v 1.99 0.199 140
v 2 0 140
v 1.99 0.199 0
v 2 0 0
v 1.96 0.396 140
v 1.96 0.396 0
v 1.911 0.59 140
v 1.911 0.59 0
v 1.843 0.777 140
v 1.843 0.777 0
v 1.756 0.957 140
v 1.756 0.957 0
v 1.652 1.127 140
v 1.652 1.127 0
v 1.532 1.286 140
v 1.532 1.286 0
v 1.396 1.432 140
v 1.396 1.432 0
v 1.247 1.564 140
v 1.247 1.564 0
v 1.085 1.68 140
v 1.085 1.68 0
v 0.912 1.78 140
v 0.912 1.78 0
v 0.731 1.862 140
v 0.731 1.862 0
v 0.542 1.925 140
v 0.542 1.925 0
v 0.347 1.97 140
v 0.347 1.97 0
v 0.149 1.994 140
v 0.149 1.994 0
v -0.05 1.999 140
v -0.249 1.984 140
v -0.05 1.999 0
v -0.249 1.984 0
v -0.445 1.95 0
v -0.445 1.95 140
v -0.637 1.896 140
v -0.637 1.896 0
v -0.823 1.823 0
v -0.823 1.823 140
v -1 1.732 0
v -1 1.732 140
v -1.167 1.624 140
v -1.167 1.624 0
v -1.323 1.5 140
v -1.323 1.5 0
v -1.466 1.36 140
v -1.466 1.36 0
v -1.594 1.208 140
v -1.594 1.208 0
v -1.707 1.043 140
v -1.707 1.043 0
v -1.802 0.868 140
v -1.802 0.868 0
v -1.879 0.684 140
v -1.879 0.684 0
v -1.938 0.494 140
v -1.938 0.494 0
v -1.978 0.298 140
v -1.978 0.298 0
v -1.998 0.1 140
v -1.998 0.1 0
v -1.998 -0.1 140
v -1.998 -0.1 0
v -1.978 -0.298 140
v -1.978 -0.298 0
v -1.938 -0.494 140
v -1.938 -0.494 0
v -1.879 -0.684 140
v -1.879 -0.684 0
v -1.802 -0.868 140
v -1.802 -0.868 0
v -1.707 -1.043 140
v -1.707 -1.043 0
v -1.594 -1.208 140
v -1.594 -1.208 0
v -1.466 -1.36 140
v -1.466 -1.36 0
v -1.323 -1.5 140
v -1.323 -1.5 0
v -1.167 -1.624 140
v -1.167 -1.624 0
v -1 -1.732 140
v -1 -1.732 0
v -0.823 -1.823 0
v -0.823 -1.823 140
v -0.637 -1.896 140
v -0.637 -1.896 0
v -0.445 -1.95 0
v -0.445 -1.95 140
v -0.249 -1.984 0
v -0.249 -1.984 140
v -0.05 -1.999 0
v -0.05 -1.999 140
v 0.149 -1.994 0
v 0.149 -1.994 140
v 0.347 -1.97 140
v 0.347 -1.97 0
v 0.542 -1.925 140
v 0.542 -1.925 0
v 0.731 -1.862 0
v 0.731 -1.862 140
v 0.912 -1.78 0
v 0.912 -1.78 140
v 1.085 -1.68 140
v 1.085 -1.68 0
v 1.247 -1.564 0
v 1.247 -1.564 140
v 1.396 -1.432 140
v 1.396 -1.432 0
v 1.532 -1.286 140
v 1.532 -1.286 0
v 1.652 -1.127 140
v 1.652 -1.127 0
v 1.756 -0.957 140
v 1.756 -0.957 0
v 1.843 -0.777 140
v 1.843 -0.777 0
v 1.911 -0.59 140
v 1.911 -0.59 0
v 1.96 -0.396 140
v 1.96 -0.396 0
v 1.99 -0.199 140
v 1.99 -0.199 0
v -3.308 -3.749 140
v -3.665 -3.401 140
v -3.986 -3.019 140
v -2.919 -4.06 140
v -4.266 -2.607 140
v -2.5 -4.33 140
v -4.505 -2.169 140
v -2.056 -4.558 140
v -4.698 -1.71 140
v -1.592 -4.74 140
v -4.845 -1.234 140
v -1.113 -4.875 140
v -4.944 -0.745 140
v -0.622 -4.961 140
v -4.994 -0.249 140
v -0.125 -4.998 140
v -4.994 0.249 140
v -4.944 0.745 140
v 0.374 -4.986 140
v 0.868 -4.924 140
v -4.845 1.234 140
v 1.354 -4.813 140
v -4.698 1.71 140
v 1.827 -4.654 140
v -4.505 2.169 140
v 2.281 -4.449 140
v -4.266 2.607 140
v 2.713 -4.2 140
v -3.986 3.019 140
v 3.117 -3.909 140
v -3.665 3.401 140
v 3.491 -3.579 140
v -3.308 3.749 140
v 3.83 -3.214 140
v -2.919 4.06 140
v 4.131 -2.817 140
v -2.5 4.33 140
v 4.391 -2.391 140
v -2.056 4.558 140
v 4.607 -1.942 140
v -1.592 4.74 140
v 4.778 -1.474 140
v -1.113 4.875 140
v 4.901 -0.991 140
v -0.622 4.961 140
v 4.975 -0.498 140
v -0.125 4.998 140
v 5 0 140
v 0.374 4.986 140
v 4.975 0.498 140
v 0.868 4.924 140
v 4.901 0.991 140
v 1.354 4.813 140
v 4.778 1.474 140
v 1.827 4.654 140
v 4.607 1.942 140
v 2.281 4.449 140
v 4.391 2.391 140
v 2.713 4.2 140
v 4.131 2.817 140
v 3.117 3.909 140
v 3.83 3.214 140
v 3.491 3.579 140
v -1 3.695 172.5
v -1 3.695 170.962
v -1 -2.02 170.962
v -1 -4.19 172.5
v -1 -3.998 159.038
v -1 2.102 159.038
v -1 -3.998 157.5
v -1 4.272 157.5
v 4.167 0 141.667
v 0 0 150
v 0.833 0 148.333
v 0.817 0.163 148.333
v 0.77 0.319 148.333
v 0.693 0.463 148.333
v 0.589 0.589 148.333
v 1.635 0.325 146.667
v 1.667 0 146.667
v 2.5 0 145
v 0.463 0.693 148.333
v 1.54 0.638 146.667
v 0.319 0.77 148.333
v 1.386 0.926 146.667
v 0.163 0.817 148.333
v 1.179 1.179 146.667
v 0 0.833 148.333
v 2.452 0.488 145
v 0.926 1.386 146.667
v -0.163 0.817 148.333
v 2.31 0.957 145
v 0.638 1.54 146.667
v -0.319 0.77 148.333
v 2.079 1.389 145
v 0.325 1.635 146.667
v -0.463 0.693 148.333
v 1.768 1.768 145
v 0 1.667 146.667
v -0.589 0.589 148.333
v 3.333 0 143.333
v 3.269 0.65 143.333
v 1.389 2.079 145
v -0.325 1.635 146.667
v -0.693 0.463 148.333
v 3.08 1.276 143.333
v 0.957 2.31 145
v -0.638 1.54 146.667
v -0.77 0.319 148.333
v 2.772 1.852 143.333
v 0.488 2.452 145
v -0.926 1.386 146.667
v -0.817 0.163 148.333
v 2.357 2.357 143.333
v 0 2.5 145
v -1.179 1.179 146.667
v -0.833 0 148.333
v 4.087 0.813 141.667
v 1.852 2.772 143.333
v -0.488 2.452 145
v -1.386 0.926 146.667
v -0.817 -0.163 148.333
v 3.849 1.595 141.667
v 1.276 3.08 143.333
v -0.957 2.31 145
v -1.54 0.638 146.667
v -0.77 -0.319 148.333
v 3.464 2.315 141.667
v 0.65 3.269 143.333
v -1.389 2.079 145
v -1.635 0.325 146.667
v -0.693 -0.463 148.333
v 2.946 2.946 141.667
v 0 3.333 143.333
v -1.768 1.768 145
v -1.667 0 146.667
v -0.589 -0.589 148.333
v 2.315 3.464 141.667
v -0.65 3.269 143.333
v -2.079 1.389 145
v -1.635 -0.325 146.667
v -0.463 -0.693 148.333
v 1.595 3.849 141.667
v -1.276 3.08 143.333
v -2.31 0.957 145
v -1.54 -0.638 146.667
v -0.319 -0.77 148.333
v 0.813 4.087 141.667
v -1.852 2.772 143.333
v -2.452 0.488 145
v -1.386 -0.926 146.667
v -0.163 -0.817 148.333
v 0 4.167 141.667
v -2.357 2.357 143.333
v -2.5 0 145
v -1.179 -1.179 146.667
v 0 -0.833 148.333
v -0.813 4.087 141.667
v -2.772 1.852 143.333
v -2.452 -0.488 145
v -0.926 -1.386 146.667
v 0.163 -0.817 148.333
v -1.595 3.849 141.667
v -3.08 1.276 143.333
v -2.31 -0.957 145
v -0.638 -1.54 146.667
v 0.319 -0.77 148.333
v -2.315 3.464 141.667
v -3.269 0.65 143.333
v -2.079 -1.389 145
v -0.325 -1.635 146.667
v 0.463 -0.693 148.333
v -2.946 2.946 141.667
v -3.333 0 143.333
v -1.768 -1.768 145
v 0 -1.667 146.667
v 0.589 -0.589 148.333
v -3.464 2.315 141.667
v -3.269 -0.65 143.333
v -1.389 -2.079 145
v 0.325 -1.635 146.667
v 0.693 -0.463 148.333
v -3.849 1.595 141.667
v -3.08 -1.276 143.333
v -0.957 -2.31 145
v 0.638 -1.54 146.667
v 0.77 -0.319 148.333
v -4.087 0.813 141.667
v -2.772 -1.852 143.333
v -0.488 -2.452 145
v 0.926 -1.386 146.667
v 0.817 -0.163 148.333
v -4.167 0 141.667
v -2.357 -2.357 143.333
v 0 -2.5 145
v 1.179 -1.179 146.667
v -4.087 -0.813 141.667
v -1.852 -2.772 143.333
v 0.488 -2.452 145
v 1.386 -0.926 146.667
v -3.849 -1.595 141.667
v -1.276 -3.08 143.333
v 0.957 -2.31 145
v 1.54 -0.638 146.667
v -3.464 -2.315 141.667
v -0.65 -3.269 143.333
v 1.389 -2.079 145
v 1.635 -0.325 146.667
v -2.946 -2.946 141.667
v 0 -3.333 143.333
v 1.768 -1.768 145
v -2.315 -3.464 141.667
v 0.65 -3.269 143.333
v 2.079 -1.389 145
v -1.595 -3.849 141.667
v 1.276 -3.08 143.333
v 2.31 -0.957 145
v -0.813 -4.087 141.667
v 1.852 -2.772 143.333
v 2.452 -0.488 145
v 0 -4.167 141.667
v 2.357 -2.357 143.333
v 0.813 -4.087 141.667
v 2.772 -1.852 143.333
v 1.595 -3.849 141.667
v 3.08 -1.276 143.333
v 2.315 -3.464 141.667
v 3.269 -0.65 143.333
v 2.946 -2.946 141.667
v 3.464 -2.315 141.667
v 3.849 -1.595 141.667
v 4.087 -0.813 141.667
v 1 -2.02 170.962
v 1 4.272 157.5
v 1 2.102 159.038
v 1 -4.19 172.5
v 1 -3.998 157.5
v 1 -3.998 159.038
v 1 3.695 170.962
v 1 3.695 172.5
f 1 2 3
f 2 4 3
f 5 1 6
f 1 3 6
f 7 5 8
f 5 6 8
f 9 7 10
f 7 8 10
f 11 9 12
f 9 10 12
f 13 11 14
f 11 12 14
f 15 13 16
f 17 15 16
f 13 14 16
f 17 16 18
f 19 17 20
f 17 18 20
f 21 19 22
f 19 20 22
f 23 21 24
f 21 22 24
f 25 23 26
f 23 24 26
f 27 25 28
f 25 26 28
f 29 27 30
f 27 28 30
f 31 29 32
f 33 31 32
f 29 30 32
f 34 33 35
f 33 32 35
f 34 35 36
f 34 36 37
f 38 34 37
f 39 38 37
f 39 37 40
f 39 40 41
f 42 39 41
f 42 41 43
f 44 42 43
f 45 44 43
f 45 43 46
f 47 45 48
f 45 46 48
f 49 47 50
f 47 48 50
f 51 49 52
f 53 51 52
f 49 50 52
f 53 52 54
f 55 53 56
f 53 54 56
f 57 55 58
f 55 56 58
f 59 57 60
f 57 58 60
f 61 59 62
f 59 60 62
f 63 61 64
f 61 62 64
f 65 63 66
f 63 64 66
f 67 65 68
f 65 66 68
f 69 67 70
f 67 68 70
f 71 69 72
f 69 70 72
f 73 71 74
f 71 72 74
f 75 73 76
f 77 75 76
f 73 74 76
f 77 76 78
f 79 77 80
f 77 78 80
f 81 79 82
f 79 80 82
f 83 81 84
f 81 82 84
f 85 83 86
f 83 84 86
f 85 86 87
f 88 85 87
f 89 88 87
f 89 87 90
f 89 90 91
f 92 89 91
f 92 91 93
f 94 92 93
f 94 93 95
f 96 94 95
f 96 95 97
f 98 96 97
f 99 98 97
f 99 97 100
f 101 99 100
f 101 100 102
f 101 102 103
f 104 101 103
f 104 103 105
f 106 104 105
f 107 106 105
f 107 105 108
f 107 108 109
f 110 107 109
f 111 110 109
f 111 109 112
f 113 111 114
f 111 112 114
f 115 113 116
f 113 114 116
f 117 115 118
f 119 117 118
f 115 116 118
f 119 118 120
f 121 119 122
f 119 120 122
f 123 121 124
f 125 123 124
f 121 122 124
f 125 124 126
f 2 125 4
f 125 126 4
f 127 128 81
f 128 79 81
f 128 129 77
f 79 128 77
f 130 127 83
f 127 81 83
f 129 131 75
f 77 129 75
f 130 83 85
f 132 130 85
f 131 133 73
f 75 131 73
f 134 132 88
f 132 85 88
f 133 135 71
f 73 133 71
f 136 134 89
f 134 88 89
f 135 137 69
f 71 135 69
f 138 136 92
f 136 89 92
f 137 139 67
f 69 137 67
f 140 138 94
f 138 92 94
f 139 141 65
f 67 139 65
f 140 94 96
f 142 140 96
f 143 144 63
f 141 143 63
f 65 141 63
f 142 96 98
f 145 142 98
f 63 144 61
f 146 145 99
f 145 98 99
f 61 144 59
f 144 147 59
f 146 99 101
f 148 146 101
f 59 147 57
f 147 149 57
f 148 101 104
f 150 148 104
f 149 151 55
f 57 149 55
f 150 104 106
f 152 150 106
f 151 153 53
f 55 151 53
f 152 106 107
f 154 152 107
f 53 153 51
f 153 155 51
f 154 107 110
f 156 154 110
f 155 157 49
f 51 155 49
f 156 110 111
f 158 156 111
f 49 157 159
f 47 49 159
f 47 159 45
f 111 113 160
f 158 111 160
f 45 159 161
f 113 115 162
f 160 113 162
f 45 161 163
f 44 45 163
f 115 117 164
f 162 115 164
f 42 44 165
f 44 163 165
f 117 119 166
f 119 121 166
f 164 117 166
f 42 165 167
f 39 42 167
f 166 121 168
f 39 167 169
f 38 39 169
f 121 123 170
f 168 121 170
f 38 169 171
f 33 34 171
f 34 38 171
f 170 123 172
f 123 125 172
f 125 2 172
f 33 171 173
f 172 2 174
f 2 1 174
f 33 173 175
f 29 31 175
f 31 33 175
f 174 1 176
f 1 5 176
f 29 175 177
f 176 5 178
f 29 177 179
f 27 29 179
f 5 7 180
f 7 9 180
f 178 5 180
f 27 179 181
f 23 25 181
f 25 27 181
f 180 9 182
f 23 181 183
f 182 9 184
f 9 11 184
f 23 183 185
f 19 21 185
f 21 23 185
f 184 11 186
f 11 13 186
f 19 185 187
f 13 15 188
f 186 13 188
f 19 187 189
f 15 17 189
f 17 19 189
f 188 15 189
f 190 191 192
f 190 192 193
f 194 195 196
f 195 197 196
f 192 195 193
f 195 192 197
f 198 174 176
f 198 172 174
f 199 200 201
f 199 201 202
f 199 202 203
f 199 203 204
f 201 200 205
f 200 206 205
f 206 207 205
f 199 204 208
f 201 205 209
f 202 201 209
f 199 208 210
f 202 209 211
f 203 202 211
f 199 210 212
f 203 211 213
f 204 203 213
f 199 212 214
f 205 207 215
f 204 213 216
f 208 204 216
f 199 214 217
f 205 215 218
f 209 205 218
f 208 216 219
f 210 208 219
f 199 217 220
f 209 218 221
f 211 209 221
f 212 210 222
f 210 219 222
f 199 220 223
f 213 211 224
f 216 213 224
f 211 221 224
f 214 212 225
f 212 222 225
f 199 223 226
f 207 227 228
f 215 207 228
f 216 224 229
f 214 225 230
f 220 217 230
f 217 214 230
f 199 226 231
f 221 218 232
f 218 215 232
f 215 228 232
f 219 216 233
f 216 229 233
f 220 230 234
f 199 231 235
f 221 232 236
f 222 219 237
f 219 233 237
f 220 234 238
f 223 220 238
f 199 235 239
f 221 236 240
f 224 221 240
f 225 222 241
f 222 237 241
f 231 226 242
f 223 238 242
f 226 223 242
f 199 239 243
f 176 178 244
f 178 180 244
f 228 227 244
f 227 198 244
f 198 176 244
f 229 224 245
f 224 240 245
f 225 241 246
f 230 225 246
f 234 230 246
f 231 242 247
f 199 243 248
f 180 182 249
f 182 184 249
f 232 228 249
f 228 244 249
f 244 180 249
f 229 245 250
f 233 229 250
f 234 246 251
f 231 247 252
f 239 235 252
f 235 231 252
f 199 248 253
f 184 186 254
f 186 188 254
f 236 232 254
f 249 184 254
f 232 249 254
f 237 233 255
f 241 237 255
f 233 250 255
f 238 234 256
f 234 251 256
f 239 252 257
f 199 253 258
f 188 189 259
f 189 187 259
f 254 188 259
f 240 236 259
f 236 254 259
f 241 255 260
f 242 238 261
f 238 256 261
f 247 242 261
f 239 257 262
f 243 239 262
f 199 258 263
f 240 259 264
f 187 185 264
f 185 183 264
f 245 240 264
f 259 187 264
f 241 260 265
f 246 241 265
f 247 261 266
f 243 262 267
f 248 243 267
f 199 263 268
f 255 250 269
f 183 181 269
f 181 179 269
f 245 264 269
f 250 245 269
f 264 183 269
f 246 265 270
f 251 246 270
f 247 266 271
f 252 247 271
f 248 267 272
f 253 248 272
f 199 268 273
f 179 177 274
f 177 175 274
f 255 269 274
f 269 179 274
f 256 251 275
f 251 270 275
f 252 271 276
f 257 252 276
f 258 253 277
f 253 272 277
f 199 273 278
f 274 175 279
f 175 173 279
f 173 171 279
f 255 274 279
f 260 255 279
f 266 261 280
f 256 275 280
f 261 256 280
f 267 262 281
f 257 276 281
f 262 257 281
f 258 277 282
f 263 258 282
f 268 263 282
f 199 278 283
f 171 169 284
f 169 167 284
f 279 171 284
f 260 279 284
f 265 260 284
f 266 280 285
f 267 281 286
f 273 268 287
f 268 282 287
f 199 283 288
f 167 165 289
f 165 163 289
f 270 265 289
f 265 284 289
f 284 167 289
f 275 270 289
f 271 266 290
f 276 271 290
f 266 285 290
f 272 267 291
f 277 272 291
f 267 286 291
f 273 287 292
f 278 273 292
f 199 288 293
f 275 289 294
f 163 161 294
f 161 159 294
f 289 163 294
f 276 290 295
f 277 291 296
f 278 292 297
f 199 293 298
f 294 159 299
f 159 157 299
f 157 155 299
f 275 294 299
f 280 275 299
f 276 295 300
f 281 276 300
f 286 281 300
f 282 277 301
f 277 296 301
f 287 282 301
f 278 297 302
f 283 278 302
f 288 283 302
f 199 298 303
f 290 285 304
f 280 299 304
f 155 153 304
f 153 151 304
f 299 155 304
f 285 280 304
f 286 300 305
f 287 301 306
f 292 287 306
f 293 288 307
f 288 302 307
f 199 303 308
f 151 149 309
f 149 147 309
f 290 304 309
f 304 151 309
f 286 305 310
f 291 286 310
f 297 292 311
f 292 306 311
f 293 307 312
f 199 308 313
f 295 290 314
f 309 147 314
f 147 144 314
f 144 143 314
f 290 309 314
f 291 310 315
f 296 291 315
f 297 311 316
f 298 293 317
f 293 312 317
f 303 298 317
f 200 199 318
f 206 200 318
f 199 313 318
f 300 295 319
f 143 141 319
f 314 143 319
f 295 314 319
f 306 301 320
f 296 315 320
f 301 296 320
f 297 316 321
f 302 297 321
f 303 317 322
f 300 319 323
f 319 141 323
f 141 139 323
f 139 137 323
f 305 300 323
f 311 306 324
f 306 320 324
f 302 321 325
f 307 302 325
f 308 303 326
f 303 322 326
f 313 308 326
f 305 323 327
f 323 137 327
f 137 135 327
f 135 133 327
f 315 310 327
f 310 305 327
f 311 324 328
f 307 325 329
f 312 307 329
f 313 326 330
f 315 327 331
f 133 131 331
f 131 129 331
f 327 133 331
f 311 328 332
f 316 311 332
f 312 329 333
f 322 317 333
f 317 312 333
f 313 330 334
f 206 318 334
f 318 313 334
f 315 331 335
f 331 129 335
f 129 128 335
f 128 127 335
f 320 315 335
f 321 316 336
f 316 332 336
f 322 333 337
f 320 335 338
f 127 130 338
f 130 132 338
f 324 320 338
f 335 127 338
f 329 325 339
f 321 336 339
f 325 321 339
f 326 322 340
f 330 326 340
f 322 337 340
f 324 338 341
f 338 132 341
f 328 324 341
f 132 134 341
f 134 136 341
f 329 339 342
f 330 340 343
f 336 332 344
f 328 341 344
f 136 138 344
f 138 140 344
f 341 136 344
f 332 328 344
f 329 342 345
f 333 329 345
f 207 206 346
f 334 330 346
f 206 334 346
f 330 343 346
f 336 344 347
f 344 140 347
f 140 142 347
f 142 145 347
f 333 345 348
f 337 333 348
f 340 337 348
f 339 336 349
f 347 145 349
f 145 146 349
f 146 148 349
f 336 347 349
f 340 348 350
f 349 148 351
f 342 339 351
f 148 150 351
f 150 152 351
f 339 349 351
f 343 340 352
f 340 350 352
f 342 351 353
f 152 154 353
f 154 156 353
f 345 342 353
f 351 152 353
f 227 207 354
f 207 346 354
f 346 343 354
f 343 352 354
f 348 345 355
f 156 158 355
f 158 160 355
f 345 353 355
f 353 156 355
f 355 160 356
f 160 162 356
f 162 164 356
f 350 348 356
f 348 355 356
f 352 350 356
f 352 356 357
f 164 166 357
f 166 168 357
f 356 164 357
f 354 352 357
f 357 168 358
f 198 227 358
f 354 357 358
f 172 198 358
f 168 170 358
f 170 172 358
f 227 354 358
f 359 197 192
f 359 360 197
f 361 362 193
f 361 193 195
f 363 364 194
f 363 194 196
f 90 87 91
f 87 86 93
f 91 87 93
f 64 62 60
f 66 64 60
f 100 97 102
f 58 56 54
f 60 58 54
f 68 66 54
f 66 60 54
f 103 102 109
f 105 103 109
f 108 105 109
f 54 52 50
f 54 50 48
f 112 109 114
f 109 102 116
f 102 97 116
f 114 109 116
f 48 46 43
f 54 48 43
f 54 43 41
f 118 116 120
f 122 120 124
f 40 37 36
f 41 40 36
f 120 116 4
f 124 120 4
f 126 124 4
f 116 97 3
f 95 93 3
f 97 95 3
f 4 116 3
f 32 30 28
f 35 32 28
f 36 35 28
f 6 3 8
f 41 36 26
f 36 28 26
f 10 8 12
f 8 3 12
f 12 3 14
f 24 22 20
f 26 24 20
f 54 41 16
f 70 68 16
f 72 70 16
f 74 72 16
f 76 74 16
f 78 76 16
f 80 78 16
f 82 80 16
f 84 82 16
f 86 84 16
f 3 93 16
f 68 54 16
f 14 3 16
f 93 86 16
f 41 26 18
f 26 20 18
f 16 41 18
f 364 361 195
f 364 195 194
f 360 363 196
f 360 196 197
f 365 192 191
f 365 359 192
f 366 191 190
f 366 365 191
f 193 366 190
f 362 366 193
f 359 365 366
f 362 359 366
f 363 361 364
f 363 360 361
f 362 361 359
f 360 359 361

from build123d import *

# Parameters (mm, degrees)
BOSS_EXTRUDE1_DEPTH      = 1
BOSS_EXTRUDE1_DEPTH_BACK = 1


with BuildPart() as part:
    # Sketch2 → Revolve1 (revolve)
    with BuildSketch(Plane(origin=(0, 0, 0), x_dir=(1, 0, 0), z_dir=(0, 1, 0))):
        Polygon((0, -150), (5, -140), (2, -140), (2, 0), (0, 0), align=None)
    revolve(axis=Axis((0, 0, -41.949952025), (0, 0, 1)))


with BuildPart() as body_2:
    # Sketch3 → Boss-Extrude1 (new, two sides: drawn at the far end of the back side and taken through both)
    with BuildSketch(Plane(origin=(0, 0, 0), x_dir=(0, -1, 0), z_dir=(1, 0, 0)).offset(-BOSS_EXTRUDE1_DEPTH_BACK)):
        Polygon((-3.694719939, -170.961538462), (-3.694719939, -172.5), (4.189895446, -172.5), (-2.102171862, -159.038461538), (3.997587754, -159.038461538), (3.997587754, -157.5), (-4.271643016, -157.5), (2.020424292, -170.961538462), align=None)
    extrude(amount=BOSS_EXTRUDE1_DEPTH + BOSS_EXTRUDE1_DEPTH_BACK)


solid = Compound([part.part, body_2.part])
